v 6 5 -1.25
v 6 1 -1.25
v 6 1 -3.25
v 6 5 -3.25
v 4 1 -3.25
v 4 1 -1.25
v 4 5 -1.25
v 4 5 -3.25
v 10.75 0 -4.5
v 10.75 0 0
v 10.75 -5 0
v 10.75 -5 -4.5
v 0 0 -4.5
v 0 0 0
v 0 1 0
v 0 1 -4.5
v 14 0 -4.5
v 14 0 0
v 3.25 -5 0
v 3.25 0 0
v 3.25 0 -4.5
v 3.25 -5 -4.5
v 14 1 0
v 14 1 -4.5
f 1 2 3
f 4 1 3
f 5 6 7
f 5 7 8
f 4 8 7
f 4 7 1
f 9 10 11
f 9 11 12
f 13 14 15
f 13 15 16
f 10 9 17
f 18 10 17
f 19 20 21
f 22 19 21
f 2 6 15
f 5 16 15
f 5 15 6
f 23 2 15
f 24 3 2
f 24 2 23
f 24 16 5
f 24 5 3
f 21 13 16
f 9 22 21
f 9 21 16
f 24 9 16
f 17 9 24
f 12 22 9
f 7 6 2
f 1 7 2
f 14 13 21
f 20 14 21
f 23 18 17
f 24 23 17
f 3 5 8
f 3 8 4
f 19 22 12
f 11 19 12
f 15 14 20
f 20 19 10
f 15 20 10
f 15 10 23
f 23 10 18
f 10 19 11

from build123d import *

# Parameters (mm, degrees)
CROQUIS1_W              = 14
CROQUIS1_H              = 4.5
SALIENTE_EXTRUIR1_DEPTH = 1
CROQUIS2_W              = 7.5
CROQUIS2_H              = 4.5
SALIENTE_EXTRUIR2_DEPTH = 6
CROQUIS3_W              = 2
CROQUIS3_H              = 2
SALIENTE_EXTRUIR3_DEPTH = 4


with BuildPart() as part:
    # Croquis1 → Saliente-Extruir1 (new body)
    with BuildSketch(Plane(origin=(0, 0, 0), x_dir=(1, 0, 0), z_dir=(0, 1, 0))):
        with Locations((7, 2.25)):
            Rectangle(CROQUIS1_W, CROQUIS1_H)
    extrude(amount=SALIENTE_EXTRUIR1_DEPTH)

    # Croquis2 → Saliente-Extruir2 (add)
    with BuildSketch(Plane(origin=(0, 1, 0), x_dir=(1, 0, 0), z_dir=(0, 1, 0))):
        with Locations((7, 2.25)):
            Rectangle(CROQUIS2_W, CROQUIS2_H)
    extrude(amount=-SALIENTE_EXTRUIR2_DEPTH)

    # Croquis3 → Saliente-Extruir3 (add)
    with BuildSketch(Plane(origin=(0, 1, 0), x_dir=(1, 0, 0), z_dir=(0, 1, 0))):
        with Locations((5, 2.25)):
            Rectangle(CROQUIS3_W, CROQUIS3_H)
    extrude(amount=SALIENTE_EXTRUIR3_DEPTH)


solid = part.part
